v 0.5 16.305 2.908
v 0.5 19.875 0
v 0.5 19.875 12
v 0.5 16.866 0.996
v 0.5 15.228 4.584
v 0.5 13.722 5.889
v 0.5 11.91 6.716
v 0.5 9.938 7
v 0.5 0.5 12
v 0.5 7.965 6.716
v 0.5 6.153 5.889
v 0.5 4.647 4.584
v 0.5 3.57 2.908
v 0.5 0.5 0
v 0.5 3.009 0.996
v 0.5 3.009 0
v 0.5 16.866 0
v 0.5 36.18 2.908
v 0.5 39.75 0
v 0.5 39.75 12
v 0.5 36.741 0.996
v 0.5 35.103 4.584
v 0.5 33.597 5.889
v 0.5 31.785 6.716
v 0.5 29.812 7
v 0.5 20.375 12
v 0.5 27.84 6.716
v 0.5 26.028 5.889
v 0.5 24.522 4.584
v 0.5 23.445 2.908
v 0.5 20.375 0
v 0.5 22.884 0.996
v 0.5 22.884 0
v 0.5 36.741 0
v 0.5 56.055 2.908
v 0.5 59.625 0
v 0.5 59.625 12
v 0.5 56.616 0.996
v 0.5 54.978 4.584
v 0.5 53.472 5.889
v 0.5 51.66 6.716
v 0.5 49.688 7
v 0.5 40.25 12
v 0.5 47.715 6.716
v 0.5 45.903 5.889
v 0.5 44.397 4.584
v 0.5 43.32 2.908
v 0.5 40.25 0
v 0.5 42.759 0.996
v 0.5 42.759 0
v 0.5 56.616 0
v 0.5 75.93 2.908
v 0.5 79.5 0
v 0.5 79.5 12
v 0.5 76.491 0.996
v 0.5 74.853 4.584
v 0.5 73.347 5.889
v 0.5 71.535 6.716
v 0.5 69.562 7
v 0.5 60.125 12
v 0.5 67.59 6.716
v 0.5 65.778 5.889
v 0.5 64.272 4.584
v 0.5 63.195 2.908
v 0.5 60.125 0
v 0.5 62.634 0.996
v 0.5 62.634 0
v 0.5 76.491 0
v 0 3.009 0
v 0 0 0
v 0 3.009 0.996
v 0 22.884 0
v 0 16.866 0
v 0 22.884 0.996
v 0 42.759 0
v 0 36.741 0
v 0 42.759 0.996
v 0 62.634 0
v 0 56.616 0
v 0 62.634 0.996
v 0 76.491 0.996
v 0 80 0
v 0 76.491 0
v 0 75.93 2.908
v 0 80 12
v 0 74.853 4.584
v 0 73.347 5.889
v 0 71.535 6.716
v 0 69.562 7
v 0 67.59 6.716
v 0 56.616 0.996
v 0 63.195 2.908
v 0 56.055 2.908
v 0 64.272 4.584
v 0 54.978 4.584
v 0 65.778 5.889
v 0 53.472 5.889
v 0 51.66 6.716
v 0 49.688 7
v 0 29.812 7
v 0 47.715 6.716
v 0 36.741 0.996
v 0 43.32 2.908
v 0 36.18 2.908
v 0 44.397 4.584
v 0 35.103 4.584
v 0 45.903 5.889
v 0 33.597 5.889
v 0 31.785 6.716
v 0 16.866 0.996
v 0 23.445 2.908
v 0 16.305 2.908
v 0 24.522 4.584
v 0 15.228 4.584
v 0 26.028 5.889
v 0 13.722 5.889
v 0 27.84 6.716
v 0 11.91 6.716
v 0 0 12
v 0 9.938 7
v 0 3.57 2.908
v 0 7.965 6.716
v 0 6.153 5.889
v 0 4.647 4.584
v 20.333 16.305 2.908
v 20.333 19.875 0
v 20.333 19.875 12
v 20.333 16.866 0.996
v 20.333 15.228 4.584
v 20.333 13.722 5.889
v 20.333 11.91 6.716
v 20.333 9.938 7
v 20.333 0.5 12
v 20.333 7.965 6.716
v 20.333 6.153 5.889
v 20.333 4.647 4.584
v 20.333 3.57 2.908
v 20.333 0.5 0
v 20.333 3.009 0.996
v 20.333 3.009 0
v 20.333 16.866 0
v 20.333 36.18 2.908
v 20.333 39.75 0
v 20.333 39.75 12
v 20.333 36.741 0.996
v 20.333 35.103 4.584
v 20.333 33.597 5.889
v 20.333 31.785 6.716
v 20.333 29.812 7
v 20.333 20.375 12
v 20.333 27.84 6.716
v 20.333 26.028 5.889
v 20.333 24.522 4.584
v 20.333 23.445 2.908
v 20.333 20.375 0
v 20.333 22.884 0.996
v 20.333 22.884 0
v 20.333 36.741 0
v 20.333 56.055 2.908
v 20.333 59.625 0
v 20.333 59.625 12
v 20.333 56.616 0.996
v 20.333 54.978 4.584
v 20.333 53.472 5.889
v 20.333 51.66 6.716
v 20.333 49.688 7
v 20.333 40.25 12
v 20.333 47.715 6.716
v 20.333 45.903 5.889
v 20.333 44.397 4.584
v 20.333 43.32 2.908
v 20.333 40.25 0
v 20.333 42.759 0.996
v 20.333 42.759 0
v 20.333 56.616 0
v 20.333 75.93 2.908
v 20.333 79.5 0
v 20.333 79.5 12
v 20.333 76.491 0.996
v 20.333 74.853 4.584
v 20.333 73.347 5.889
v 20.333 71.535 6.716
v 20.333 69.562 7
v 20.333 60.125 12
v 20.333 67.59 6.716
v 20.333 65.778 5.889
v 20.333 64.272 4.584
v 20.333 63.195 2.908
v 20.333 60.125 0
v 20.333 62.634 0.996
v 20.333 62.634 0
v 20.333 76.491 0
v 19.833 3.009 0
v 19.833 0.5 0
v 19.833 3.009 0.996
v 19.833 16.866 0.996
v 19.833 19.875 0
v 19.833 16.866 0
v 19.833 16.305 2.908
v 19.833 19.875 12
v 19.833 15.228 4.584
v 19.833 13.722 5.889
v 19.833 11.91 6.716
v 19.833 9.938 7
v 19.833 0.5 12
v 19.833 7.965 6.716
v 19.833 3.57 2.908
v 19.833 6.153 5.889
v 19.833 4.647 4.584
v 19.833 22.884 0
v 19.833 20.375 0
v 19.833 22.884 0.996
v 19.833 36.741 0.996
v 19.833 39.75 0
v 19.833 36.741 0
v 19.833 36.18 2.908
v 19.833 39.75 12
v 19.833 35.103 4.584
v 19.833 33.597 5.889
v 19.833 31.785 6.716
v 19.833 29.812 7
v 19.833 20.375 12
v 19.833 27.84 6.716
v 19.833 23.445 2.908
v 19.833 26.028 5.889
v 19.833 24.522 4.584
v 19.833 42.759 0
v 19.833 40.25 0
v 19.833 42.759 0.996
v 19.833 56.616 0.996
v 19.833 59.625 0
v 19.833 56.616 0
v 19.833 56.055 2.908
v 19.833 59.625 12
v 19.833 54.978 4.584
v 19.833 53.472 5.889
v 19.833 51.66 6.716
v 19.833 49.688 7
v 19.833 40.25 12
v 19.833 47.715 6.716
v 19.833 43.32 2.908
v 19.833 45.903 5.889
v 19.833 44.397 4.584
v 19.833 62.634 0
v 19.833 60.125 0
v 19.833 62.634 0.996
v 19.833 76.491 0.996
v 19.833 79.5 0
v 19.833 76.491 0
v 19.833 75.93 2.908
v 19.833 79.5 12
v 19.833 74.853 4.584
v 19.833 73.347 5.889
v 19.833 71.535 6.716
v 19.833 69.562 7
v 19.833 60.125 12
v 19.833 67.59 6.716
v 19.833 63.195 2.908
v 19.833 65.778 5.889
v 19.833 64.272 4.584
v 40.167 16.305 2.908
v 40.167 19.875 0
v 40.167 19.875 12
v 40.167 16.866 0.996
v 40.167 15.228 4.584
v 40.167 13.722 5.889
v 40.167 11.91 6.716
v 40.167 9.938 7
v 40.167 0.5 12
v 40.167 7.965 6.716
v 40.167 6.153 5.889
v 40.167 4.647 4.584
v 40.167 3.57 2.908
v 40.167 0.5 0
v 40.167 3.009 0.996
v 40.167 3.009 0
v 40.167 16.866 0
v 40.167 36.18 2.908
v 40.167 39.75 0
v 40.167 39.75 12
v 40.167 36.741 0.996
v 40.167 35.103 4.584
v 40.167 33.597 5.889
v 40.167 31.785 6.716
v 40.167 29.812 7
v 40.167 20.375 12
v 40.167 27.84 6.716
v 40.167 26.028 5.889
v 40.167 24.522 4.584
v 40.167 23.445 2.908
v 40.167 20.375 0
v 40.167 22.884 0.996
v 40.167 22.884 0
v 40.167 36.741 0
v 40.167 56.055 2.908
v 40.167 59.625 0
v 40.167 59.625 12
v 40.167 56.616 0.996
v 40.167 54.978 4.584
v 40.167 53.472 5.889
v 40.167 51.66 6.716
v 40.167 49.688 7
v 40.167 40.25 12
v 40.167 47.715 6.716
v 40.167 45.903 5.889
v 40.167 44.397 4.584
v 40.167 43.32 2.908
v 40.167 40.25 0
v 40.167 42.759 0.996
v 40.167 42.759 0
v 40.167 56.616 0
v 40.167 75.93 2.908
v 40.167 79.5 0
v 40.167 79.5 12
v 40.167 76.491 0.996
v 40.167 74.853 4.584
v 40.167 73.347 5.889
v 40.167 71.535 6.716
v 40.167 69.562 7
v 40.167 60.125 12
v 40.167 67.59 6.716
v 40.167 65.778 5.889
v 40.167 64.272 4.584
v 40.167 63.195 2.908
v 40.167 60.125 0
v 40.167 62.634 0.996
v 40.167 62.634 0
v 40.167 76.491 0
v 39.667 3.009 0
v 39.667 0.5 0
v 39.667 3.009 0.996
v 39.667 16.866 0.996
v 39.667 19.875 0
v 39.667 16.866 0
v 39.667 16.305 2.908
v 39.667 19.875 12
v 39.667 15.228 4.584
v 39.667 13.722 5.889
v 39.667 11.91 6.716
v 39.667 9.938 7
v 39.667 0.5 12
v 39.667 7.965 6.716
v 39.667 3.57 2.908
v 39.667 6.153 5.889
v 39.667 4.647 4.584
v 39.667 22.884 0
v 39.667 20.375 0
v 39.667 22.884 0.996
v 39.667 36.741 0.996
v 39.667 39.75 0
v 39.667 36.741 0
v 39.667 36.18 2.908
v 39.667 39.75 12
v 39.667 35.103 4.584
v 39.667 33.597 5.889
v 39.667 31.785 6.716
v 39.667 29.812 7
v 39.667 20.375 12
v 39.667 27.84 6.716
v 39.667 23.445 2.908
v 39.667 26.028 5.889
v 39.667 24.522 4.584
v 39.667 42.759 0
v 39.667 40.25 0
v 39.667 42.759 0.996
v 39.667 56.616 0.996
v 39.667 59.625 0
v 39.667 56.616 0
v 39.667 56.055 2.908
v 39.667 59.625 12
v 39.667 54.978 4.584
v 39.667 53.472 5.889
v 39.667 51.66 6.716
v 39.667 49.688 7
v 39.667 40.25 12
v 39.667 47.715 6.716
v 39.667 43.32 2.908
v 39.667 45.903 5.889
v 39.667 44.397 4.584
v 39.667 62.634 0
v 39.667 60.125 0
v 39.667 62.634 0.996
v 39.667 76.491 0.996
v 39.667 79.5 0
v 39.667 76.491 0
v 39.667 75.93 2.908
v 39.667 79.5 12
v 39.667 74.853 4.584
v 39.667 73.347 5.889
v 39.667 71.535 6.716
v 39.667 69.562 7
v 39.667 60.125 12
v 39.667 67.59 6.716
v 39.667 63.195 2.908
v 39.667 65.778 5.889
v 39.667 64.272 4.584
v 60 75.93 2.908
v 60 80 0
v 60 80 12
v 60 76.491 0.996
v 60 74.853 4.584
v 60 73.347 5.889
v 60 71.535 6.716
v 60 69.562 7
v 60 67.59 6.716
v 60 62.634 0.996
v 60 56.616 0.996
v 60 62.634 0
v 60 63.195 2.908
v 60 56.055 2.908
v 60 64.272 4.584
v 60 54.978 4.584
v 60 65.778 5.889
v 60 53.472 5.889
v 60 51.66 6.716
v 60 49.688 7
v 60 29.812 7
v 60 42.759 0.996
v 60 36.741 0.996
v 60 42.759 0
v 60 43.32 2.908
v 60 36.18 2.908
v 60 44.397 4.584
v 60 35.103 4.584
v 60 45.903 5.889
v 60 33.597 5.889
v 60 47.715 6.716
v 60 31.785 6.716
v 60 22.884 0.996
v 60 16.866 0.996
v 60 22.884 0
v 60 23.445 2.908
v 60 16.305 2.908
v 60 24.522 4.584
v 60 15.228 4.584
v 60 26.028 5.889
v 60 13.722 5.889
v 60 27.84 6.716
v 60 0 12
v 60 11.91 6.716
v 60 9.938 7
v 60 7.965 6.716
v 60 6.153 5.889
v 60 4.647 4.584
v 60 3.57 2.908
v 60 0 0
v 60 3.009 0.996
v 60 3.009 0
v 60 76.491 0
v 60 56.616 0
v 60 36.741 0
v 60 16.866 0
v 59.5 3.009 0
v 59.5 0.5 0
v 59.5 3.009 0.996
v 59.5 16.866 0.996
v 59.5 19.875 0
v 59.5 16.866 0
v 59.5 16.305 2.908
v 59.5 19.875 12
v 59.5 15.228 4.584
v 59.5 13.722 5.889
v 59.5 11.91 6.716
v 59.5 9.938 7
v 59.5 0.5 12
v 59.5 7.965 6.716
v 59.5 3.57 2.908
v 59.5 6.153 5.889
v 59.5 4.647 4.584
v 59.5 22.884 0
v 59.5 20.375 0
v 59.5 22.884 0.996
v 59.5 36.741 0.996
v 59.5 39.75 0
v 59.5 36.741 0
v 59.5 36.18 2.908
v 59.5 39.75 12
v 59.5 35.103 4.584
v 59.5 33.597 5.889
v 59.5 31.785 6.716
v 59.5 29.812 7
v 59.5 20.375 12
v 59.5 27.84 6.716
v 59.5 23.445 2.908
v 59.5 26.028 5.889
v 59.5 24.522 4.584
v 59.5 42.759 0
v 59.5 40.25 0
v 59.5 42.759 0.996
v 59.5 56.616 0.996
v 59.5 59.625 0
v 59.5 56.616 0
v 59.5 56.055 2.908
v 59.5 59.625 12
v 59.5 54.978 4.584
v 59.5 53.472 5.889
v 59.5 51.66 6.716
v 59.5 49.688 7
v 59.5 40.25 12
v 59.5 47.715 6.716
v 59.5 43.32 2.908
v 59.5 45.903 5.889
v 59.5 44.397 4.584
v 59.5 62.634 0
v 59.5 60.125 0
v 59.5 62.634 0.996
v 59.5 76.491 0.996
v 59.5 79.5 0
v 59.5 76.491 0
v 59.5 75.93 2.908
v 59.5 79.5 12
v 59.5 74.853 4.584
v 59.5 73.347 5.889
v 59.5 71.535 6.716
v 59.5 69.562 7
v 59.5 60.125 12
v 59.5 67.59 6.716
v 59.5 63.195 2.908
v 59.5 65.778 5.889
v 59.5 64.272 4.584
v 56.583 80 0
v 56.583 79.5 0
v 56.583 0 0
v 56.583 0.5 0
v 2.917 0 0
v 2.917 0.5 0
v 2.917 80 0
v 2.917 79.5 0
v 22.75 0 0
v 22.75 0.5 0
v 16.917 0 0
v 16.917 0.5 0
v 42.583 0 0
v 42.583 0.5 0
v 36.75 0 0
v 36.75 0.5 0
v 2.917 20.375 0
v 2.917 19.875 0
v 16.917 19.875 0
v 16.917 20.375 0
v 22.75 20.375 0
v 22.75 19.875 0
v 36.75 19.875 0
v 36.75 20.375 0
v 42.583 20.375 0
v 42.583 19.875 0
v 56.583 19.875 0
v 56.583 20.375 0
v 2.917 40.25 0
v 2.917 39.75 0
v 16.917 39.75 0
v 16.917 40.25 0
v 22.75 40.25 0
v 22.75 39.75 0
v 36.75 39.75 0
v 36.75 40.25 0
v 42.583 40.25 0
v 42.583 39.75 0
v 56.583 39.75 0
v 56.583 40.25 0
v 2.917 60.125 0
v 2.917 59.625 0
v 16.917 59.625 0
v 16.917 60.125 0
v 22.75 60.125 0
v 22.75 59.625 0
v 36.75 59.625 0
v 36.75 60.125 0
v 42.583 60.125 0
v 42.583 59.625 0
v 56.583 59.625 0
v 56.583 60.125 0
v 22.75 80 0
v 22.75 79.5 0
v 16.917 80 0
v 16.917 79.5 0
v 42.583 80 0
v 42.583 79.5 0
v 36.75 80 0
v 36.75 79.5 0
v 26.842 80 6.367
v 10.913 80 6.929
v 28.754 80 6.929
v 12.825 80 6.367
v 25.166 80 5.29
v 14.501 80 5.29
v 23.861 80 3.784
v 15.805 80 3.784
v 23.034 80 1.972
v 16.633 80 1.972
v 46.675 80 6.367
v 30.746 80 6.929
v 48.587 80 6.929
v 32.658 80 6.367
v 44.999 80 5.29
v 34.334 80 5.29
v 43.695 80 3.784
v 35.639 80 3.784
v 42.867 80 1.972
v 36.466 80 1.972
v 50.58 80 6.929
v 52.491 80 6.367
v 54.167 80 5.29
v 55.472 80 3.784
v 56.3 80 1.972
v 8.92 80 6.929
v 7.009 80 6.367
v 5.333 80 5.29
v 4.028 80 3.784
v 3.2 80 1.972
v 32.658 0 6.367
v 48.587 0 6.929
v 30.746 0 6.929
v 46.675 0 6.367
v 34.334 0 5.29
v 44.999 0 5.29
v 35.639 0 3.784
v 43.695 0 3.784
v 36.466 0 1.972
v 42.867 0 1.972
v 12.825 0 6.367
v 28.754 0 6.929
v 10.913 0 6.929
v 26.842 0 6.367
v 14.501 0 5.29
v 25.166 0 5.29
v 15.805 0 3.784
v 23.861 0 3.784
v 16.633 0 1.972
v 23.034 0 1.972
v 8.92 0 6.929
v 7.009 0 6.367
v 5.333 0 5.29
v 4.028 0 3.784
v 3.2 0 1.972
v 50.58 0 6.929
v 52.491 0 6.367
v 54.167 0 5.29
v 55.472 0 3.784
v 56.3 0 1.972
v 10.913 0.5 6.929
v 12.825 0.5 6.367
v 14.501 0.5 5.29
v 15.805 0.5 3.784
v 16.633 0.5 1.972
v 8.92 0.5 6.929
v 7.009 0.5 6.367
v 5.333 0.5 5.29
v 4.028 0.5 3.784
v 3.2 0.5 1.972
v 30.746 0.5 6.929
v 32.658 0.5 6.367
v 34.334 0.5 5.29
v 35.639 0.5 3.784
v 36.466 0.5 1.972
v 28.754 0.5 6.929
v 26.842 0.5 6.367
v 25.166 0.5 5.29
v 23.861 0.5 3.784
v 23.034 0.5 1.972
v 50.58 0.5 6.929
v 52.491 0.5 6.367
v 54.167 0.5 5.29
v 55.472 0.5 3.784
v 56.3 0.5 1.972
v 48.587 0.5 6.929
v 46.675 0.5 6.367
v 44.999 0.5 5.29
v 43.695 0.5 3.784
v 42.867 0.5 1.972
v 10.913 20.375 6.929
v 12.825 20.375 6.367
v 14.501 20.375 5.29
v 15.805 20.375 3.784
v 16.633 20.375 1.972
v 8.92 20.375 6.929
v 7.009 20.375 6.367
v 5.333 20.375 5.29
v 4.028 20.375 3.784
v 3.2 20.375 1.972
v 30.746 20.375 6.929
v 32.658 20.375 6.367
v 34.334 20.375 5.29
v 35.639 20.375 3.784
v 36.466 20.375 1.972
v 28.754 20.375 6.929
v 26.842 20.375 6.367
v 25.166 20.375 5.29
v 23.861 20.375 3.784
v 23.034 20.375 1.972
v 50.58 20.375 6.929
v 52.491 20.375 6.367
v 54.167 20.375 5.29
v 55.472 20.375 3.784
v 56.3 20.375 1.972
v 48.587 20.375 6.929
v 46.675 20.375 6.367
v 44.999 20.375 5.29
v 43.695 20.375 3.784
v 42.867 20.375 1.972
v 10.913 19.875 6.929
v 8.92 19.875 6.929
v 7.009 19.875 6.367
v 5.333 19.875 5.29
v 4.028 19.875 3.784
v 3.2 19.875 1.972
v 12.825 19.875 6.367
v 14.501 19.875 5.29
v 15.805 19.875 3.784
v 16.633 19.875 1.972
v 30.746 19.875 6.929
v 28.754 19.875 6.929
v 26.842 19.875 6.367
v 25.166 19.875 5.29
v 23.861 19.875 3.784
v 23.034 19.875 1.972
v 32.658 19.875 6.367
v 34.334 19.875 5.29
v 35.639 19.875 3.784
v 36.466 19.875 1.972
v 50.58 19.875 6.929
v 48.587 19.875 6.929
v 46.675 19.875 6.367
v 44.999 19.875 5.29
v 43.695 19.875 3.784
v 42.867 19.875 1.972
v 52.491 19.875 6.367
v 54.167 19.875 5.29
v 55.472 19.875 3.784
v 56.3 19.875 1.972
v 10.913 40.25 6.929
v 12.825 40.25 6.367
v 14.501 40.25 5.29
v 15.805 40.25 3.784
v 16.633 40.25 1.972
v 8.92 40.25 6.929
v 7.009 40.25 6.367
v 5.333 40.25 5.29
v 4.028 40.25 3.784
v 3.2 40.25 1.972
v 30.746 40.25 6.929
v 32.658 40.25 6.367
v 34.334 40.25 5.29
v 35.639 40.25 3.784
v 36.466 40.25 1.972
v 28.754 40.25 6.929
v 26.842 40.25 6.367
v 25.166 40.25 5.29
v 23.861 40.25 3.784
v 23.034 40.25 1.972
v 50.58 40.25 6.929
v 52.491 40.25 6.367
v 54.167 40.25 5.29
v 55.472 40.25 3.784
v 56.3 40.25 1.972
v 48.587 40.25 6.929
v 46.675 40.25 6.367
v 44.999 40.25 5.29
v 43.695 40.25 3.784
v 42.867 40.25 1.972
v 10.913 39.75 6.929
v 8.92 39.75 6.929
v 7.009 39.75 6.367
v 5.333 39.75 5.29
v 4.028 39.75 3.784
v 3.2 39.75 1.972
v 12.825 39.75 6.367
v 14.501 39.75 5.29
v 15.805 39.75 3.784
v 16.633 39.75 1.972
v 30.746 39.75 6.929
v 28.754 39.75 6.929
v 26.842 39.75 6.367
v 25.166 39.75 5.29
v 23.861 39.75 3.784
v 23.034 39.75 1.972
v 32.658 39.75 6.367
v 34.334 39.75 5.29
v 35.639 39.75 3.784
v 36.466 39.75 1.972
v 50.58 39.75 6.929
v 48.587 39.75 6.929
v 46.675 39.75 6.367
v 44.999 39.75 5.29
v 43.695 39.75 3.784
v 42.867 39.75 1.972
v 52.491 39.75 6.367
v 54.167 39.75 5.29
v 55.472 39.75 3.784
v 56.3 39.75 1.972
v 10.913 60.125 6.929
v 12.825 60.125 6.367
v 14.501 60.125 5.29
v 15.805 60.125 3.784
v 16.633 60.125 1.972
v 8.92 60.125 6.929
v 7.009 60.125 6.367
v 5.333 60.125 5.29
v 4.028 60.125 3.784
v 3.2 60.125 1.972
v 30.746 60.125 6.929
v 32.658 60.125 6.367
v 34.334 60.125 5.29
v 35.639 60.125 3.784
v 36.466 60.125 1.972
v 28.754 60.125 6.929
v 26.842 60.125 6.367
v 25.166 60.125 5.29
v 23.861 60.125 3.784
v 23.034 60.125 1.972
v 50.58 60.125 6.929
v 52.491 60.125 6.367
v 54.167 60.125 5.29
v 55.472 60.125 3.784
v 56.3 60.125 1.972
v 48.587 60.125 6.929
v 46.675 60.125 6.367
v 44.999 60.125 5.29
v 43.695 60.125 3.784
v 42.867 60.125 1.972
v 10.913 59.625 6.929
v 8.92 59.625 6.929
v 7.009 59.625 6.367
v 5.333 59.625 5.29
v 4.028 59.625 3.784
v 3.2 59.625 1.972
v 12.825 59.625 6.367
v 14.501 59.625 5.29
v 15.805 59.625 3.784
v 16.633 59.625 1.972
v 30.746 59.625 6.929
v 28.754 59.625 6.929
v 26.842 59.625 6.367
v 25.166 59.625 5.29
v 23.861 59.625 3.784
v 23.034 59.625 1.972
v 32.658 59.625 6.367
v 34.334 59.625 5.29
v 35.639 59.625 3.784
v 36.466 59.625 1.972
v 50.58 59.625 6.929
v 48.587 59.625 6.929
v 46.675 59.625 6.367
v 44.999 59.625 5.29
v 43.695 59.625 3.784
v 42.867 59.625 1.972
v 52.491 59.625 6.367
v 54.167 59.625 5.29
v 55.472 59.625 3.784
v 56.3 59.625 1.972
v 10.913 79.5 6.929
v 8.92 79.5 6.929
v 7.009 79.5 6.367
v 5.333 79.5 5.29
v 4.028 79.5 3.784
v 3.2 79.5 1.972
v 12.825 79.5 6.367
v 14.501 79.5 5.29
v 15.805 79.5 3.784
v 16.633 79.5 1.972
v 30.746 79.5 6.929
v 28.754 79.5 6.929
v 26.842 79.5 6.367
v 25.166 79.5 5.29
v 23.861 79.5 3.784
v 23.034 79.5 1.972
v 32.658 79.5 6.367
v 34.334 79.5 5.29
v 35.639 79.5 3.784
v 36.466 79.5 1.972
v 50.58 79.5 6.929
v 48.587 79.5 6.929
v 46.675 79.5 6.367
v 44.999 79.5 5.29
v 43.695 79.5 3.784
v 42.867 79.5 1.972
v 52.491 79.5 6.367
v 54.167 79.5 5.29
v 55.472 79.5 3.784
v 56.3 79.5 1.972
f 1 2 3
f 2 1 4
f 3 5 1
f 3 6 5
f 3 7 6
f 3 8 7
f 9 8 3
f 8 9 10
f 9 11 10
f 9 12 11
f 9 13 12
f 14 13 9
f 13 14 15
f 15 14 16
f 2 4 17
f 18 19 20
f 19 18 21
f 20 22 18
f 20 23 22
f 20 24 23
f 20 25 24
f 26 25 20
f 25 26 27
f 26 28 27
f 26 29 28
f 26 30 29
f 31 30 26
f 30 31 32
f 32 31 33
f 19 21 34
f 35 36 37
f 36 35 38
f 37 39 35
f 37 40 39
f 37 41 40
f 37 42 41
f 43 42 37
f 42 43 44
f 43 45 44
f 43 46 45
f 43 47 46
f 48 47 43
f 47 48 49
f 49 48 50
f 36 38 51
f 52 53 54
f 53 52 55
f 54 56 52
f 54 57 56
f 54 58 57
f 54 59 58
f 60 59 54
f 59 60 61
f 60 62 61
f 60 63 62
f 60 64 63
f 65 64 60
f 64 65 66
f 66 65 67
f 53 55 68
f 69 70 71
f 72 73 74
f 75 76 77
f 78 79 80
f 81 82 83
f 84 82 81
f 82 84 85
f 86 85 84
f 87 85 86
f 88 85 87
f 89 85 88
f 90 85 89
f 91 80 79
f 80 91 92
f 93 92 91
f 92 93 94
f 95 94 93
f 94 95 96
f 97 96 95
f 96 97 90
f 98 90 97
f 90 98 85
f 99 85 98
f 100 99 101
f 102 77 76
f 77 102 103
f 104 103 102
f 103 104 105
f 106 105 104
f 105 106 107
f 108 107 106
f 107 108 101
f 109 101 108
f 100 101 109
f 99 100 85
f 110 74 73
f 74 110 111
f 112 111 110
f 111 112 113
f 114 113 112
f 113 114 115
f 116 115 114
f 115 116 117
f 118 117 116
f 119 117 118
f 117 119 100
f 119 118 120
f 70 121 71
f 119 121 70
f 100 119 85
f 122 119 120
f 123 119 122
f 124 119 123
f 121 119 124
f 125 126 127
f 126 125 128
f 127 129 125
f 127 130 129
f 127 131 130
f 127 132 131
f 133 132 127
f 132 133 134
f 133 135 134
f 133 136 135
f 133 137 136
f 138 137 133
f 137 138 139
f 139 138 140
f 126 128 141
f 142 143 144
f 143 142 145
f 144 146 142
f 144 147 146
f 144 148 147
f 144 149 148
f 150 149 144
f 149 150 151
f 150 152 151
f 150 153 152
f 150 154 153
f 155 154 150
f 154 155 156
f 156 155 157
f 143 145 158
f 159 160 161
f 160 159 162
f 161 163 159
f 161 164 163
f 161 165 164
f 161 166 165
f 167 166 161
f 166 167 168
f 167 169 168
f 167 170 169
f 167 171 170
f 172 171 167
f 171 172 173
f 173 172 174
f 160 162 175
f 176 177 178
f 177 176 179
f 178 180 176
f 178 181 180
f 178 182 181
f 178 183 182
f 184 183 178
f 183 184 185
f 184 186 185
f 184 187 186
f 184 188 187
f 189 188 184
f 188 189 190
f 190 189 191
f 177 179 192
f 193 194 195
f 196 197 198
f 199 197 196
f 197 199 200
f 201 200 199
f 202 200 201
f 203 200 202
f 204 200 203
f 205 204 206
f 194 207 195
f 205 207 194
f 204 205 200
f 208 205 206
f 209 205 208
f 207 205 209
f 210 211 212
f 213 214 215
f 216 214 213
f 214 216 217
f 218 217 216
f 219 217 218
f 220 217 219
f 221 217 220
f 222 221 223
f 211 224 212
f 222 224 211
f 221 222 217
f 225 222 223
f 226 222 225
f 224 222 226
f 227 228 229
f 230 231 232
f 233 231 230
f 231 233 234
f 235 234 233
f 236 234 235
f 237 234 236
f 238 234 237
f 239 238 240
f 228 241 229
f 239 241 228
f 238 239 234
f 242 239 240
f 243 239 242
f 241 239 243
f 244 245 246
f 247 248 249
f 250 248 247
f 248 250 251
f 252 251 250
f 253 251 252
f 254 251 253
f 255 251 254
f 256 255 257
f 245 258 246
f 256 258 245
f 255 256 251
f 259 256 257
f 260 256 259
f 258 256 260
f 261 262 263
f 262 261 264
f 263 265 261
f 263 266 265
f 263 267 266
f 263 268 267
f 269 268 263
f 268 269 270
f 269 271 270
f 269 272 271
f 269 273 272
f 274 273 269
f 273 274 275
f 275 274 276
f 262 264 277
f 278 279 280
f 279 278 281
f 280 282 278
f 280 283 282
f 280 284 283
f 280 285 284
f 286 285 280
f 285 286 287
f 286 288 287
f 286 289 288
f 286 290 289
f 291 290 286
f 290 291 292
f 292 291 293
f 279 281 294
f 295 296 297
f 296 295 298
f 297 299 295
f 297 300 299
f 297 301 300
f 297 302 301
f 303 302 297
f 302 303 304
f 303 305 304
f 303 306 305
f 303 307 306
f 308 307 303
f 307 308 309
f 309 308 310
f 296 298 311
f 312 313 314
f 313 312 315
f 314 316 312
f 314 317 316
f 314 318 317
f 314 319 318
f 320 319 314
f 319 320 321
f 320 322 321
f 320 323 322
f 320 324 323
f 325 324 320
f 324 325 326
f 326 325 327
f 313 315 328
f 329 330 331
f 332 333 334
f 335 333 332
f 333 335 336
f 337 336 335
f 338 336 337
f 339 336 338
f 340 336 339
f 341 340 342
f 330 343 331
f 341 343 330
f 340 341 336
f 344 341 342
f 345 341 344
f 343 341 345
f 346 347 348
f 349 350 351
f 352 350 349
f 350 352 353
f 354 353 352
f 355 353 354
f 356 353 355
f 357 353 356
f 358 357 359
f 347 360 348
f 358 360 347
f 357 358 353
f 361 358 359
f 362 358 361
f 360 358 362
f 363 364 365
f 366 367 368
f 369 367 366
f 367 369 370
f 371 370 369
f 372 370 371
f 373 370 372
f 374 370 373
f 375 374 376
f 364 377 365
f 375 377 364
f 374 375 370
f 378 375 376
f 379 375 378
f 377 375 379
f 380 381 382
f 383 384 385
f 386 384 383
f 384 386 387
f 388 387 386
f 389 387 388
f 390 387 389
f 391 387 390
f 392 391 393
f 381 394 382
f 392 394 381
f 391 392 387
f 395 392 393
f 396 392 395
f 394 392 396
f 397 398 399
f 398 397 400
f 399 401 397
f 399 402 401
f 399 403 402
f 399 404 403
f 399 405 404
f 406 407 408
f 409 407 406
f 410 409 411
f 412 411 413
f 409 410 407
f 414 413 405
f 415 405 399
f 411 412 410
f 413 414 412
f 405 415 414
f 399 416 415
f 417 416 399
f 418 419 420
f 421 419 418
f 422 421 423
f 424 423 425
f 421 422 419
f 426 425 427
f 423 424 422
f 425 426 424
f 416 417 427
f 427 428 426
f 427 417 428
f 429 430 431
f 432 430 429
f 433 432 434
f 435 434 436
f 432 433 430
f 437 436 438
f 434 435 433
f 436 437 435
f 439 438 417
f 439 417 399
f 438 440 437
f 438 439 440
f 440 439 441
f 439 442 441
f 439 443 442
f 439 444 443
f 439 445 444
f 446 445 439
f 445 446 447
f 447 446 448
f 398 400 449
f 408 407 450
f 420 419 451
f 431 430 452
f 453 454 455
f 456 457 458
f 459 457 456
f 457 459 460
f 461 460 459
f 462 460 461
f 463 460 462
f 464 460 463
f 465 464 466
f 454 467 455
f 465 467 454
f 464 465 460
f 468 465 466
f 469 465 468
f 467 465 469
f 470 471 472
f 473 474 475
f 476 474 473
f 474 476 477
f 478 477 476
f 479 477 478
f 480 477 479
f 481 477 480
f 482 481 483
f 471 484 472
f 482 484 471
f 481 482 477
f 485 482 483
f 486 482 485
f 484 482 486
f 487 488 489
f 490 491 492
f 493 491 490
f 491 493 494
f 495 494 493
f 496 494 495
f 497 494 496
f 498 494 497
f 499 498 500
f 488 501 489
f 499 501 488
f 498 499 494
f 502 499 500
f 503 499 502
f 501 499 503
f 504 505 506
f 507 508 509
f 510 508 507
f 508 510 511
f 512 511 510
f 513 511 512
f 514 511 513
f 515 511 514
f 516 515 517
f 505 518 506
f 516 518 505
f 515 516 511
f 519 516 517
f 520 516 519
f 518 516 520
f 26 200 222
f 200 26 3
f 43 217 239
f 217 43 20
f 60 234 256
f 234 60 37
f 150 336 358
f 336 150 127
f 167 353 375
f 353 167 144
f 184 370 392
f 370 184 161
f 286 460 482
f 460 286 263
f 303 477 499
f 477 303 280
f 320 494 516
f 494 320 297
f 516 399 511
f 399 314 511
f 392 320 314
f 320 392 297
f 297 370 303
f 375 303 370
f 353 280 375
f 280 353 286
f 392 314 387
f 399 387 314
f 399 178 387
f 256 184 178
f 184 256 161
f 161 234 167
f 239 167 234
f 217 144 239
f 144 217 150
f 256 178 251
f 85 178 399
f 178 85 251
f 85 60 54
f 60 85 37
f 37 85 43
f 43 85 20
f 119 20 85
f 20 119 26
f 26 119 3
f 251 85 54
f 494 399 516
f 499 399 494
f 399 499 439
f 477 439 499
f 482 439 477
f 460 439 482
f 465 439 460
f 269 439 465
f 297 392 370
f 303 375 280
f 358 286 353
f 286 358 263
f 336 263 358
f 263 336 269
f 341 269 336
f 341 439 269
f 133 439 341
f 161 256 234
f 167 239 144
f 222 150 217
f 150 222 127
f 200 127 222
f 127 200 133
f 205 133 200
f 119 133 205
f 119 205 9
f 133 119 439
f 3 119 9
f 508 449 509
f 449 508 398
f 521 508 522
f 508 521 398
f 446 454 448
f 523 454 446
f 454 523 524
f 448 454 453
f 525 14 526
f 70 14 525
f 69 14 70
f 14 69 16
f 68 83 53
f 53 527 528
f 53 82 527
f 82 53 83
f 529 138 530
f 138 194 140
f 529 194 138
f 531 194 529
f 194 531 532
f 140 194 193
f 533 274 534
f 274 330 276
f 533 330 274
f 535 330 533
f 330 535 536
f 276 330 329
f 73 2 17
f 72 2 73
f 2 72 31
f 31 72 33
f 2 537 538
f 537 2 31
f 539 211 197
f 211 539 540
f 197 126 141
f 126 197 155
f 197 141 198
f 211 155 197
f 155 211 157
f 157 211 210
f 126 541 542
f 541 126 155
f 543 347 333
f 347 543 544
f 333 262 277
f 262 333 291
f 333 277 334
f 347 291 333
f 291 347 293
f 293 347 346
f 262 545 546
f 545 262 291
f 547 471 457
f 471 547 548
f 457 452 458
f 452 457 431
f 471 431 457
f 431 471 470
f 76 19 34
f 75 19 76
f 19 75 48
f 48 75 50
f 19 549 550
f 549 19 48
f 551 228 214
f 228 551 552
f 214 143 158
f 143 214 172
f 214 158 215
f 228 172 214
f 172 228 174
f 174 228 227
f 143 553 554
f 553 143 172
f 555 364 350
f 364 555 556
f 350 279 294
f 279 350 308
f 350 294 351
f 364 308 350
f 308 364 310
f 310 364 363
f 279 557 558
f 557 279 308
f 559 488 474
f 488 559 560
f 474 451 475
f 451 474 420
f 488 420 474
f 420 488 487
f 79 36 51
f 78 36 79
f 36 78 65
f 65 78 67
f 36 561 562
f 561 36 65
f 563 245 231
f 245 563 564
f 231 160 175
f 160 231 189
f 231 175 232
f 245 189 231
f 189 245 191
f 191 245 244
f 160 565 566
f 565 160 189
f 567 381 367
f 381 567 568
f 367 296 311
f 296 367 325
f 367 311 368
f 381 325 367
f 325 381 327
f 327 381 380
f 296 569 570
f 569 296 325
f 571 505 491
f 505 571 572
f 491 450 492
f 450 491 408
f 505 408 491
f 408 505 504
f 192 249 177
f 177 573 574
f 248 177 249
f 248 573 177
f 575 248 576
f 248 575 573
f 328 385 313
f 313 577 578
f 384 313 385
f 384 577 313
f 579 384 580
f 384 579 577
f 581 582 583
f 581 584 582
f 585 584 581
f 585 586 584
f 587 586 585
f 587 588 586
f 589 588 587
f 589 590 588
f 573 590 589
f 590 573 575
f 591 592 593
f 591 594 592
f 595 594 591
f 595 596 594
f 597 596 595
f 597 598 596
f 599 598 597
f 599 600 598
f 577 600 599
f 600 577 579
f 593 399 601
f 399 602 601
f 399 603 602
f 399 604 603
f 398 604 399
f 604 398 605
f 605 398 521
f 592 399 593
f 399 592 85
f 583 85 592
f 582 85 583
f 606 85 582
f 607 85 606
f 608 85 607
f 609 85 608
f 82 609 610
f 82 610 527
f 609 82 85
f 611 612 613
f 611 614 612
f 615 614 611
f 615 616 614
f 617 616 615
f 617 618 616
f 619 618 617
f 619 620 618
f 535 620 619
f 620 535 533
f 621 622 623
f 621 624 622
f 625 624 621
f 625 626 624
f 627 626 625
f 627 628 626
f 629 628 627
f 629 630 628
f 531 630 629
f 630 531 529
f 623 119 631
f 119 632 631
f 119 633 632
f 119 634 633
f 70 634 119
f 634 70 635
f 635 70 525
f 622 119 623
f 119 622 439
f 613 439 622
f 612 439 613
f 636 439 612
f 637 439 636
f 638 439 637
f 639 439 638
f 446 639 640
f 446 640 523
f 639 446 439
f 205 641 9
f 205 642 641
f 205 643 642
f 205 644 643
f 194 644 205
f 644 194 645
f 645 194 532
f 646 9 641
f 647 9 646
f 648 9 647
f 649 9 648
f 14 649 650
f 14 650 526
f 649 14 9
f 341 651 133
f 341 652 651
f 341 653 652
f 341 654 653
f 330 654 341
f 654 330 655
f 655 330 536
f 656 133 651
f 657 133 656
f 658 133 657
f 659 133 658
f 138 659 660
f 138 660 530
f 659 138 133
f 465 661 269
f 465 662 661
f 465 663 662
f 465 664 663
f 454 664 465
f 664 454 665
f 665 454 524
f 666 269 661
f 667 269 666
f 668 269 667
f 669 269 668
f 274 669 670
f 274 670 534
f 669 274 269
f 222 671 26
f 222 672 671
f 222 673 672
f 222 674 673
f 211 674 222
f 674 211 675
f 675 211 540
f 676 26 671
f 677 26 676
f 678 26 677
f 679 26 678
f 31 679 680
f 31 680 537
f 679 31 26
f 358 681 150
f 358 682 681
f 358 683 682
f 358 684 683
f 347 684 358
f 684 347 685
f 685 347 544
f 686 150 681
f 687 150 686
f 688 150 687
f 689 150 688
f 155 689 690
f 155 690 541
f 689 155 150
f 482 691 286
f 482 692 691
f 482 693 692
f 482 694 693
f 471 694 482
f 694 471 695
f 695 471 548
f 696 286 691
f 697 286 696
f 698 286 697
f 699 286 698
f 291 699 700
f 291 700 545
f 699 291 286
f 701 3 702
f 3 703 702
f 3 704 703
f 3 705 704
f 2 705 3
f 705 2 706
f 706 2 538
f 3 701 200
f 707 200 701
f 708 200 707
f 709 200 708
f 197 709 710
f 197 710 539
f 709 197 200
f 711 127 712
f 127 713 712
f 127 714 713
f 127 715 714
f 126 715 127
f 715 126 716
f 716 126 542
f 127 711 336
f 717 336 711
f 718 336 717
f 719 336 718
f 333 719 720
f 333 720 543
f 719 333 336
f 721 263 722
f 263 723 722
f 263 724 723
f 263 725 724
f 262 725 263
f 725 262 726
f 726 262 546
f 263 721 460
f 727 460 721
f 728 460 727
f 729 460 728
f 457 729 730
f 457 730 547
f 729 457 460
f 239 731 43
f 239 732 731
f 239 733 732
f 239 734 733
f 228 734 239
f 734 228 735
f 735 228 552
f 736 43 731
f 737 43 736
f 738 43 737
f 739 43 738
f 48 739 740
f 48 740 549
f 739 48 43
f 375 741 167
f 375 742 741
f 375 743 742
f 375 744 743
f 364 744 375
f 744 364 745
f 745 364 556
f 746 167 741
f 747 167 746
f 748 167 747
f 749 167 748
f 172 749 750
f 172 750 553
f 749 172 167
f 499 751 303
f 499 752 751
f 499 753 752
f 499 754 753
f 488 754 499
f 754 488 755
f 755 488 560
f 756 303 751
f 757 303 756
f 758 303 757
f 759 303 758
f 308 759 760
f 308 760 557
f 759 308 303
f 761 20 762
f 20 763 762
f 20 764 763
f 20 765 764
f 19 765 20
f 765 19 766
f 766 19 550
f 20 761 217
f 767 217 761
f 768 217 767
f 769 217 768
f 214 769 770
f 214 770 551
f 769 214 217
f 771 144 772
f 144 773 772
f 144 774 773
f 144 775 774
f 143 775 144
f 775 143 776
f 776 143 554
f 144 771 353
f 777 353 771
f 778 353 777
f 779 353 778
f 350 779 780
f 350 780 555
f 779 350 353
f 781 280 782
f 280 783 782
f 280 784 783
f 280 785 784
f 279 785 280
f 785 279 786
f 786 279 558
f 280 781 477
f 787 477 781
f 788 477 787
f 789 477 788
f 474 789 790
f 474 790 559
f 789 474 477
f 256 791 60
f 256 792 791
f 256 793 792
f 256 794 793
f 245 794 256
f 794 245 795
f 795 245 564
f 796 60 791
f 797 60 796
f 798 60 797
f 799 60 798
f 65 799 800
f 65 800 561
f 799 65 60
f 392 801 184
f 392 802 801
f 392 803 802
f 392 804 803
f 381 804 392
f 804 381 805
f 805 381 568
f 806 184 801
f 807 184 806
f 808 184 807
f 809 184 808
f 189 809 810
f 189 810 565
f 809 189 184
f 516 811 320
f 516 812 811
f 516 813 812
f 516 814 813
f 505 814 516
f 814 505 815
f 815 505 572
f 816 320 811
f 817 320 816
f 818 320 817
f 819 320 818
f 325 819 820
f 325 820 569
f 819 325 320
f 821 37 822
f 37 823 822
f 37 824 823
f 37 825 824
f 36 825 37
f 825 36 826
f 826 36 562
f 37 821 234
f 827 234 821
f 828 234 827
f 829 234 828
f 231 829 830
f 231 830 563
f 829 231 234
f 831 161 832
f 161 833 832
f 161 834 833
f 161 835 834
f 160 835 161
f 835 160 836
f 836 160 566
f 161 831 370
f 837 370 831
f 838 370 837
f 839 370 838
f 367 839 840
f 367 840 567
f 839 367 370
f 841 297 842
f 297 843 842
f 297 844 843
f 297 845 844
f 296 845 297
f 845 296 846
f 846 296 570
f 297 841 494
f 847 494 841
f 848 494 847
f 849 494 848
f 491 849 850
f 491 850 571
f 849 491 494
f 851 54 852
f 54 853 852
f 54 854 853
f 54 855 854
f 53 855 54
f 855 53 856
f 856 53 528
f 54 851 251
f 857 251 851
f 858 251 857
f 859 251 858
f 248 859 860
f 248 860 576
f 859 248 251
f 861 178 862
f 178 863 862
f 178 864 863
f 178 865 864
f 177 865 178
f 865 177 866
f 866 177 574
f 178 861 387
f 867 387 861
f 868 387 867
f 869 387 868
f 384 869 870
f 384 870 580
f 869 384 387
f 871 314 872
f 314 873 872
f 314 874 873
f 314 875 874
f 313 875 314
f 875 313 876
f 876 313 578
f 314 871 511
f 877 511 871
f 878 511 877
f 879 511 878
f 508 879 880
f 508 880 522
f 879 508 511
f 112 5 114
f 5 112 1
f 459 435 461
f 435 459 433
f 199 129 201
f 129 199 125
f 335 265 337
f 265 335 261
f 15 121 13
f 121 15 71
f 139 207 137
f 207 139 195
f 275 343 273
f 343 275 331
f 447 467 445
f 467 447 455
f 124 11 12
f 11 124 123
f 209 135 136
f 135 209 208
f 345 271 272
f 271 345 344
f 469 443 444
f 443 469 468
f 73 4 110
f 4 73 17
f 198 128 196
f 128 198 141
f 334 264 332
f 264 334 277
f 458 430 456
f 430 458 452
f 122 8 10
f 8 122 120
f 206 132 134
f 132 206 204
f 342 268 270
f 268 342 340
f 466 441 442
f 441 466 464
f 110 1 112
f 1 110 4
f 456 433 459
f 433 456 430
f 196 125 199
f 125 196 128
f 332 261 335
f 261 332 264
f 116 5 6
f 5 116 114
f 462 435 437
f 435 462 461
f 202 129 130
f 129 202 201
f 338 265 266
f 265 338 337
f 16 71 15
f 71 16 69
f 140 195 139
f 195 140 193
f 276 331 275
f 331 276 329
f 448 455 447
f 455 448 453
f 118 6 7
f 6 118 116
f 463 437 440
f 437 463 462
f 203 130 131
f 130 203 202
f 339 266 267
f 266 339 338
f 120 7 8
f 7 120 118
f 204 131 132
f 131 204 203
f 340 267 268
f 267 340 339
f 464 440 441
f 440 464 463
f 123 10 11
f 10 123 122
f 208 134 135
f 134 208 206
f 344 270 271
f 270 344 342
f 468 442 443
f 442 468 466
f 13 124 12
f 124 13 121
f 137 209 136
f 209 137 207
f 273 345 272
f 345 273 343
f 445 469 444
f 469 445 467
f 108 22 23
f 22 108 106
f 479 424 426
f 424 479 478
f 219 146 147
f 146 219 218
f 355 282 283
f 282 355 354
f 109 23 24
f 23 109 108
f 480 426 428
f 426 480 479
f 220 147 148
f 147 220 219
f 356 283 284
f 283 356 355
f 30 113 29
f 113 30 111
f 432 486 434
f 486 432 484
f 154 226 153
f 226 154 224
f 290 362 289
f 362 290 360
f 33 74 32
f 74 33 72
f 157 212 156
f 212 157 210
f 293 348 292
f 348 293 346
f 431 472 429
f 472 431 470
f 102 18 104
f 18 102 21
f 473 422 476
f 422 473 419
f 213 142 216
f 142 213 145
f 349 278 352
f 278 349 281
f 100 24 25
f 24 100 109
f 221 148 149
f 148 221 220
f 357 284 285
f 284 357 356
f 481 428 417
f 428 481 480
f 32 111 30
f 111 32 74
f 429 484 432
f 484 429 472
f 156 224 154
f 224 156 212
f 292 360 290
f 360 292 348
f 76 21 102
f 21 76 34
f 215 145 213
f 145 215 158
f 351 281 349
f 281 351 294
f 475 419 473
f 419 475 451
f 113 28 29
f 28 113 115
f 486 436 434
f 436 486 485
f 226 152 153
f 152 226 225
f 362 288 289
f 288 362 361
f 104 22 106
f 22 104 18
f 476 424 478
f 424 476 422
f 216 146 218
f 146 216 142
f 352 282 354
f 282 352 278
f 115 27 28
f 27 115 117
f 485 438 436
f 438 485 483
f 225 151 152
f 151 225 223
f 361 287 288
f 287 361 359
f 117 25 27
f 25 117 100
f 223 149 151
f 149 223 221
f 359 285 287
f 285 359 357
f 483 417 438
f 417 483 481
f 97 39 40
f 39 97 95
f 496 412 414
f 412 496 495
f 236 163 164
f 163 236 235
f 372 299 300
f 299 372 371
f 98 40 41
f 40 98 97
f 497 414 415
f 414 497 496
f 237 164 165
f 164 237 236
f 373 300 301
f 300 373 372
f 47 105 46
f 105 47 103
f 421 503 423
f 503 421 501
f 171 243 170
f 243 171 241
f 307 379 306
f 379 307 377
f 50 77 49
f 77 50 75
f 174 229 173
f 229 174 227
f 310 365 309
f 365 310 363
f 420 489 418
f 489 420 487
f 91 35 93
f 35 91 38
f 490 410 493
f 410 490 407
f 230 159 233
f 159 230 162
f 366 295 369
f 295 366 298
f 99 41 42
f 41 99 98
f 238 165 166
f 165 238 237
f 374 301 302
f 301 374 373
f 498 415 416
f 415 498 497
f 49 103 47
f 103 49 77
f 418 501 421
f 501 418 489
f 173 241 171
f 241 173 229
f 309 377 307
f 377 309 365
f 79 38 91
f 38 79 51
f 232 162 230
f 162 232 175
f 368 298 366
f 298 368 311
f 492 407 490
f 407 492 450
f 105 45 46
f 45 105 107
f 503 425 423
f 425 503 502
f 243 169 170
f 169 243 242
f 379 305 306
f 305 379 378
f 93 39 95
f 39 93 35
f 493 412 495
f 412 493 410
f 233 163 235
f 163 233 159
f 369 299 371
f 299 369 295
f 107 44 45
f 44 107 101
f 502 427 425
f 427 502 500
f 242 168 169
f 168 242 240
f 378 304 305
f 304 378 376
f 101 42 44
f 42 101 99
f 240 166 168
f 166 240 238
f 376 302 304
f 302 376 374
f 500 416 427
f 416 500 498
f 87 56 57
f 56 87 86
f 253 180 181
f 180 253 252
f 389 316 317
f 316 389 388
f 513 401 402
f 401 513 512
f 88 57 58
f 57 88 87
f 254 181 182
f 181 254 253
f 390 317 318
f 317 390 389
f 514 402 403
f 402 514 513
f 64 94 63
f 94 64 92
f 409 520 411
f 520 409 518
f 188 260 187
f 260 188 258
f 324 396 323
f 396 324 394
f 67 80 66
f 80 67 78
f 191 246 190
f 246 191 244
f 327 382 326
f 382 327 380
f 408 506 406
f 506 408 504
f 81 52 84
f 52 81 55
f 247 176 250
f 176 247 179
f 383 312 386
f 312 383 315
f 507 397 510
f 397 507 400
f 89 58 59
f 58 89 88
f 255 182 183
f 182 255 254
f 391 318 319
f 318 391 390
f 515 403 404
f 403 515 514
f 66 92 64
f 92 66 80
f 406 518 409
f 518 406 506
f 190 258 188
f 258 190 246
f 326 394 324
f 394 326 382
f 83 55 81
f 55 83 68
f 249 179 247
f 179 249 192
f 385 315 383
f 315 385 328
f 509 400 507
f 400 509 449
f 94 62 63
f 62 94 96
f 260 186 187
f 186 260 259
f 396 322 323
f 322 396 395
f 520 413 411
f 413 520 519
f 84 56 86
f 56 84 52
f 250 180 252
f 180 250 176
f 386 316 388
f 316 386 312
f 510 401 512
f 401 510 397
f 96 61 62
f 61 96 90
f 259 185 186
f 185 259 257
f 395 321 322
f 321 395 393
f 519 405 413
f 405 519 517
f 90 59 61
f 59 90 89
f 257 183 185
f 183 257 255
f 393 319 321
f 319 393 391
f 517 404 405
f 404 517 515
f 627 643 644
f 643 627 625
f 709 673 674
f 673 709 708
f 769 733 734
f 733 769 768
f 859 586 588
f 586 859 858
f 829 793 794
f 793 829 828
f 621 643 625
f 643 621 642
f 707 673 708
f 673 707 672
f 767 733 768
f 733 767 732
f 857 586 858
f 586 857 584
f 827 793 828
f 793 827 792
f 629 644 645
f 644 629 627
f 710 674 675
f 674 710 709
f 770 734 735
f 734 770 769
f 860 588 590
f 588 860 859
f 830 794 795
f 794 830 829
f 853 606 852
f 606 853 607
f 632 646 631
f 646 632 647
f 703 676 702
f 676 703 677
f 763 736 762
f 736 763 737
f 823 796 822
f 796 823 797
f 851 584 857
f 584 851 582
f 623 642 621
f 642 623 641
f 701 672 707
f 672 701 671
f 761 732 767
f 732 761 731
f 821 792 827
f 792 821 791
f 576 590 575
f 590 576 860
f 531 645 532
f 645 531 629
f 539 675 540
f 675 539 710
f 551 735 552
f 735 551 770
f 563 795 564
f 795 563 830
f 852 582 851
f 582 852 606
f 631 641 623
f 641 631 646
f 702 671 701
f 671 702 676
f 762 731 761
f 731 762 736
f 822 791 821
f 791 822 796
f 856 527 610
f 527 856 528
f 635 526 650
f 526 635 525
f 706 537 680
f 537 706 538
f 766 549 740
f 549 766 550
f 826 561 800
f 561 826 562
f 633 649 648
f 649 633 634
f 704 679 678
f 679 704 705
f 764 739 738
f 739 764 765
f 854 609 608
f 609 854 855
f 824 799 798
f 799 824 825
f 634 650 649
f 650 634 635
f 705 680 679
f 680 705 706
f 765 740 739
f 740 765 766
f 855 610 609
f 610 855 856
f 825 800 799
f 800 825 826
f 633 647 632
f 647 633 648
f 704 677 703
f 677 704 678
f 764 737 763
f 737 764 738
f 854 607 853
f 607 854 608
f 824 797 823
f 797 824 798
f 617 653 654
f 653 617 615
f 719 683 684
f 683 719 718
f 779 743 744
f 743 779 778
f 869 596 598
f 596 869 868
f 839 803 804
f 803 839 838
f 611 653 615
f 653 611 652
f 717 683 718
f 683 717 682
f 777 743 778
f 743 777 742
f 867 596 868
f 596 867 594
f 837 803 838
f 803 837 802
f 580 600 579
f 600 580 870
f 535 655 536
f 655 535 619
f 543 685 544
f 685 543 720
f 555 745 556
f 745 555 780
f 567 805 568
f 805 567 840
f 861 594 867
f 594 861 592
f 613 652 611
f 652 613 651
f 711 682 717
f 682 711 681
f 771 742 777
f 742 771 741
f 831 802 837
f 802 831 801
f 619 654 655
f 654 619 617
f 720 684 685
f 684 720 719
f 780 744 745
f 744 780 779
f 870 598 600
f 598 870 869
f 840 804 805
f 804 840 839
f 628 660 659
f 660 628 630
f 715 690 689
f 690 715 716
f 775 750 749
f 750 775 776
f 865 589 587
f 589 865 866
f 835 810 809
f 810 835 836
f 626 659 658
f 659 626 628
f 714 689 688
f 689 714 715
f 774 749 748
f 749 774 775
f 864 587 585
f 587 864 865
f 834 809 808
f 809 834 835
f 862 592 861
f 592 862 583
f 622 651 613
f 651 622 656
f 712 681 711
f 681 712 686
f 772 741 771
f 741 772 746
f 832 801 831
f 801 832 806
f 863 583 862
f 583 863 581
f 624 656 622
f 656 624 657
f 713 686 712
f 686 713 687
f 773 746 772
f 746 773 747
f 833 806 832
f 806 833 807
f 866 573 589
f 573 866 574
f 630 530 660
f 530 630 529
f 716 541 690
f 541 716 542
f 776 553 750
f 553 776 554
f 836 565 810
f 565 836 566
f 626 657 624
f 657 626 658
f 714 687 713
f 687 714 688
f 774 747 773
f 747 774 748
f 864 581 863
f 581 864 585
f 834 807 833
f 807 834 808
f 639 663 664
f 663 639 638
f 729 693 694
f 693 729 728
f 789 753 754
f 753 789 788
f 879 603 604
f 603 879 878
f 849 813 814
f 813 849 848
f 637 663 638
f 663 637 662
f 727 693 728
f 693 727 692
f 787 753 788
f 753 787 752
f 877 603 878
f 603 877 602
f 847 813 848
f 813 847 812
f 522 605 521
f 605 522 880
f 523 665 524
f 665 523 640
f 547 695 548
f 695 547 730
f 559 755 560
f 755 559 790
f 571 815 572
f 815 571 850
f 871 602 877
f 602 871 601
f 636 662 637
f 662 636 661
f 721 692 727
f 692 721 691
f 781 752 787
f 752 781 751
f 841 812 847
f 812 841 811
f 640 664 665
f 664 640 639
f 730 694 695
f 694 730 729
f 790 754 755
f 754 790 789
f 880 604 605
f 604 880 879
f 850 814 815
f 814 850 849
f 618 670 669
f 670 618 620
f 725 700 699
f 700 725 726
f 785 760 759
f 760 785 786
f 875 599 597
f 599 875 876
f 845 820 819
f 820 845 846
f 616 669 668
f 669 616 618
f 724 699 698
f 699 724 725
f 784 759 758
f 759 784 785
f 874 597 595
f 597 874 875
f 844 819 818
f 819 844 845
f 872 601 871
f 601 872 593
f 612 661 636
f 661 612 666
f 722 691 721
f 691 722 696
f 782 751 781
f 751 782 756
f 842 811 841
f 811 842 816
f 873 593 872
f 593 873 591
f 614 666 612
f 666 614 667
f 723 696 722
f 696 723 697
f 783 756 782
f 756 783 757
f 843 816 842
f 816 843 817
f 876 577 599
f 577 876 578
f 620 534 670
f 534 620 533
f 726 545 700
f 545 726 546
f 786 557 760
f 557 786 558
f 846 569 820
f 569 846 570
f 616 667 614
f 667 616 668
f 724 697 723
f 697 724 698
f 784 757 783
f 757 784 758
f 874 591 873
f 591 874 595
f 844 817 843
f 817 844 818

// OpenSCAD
x=60;
y=80;
z=12;


x_ribs=4;
y_ribs=3;

rib=0.5;

pad=0.1;


module bed() {
    color("white")
    translate([0,0,z])
    cube([x,y,z]);
}

module positive() {
    cube([x,y,z]);
}

module x_rib(y=0) {
    translate([-x/2,y,-z/2])
    cube([x*2,rib,z*2]); 
}

module y_rib(x=0) {
    translate([x,-y/2,-z/2])
    cube([rib,y*2,z*2]); 
}

module x_ribs(ribs=x_ribs) {
    intersection() {
        children();
        translate([0,(y-rib)/x_ribs/2,0])
        for(y=[0:(y-rib)/x_ribs:y-rib]) {
            x_rib(y);
        }
    }
}

module y_ribs(ribs=y_ribs) {
    intersection() {
        children();
        translate([(x-rib)/ribs/2,0,0])
        for(x=[0:(x-rib)/ribs:x-rib]) {
            y_rib(x);
        }
    }
}

module x_flat_ribs(ribs=x_ribs) {
    intersection() {
        children();
        for(y=[0:(y-rib)/ribs:y-rib+pad]) {
            x_rib(y);
        }
    }
}

module y_flat_ribs(ribs=y_ribs) {
    intersection() {
        children();
        for(x=[0:(x-rib)/ribs:x-rib+pad]) {
            y_rib(x);
        }
    }
}


module flat_ribs() {
    y_flat_ribs()
    children();
    x_flat_ribs()
    children();
}

module ribs() {
    y_ribs()
    children();
    x_ribs()
    children();
}

module castle() {
    difference() {
        flat_ribs()
        positive();
        translate([0,(y-rib)/x_ribs/2,0])
        for(y=[0:(y-rib)/x_ribs:y-rib]) {
            translate([-pad,y,0])
            rotate([0,90,0])
            cylinder(d=14,h=x+pad*2);
        }
        translate([(x-rib)/y_ribs/2,0,0])
        for(x=[0:(x-rib)/y_ribs:x-rib]) {
            translate([x,-pad,0])
            rotate([-90,0,0])
            cylinder(d=14,h=y+pad*2);
        }
    }
}

module block() {
    ribs()
    cube([x,y,z]);
}

module flared_block() {
    inner_cut=4;
    ribs()
    hull() {
        translate([0,0,z-pad])
        cube([x,y,pad]);
        translate([inner_cut,inner_cut,0])
        cube([x-inner_cut*2,y-inner_cut*2,pad]);
    }
}

rays=17;

module ray(i=0) {
    rotate([0,0,-i])
    translate([-rib/2,0,-z/2])
    cube([rib,y*4,z*2]); 
}

module rays(center_x,center_y) {
    intersection() {
        children();
        translate([-center_x,-center_y,0])
        for(i=[0:90/rays:90]) {
            ray(i);
        }
    }
}


diag_ribs=5;

module diag_rib(diag=0) {
    rotate([0,0,-atan(x/y)])
    translate([-(x+y)*2,diag,-z/2])
    cube([(x+y)*4,rib,z*2]); 
}

diag=sqrt(x*x+y*y);
module diag_ribs(ribs=x_ribs) {
    intersection() {
        children();
        for(y=[0:diag/diag_ribs:diag]) {
            diag_rib(y);
        }
    }
}

module mirror_diag() {
    diag_ribs()
    positive();
}

module mirror_rays() {
    rays(62,62)
    positive();
    translate([x,0,0])
    mirror([1,0,0])
    rays(62,62)
    positive();
}

module _floor() {
    color("black")
    translate([-x,-y,-pad])
    cube([x*3,y*3,pad*2]);
}

module room() {
    _floor();
    bed();
}
//room();
//flared_block();
//mirror_rays();

castle();
